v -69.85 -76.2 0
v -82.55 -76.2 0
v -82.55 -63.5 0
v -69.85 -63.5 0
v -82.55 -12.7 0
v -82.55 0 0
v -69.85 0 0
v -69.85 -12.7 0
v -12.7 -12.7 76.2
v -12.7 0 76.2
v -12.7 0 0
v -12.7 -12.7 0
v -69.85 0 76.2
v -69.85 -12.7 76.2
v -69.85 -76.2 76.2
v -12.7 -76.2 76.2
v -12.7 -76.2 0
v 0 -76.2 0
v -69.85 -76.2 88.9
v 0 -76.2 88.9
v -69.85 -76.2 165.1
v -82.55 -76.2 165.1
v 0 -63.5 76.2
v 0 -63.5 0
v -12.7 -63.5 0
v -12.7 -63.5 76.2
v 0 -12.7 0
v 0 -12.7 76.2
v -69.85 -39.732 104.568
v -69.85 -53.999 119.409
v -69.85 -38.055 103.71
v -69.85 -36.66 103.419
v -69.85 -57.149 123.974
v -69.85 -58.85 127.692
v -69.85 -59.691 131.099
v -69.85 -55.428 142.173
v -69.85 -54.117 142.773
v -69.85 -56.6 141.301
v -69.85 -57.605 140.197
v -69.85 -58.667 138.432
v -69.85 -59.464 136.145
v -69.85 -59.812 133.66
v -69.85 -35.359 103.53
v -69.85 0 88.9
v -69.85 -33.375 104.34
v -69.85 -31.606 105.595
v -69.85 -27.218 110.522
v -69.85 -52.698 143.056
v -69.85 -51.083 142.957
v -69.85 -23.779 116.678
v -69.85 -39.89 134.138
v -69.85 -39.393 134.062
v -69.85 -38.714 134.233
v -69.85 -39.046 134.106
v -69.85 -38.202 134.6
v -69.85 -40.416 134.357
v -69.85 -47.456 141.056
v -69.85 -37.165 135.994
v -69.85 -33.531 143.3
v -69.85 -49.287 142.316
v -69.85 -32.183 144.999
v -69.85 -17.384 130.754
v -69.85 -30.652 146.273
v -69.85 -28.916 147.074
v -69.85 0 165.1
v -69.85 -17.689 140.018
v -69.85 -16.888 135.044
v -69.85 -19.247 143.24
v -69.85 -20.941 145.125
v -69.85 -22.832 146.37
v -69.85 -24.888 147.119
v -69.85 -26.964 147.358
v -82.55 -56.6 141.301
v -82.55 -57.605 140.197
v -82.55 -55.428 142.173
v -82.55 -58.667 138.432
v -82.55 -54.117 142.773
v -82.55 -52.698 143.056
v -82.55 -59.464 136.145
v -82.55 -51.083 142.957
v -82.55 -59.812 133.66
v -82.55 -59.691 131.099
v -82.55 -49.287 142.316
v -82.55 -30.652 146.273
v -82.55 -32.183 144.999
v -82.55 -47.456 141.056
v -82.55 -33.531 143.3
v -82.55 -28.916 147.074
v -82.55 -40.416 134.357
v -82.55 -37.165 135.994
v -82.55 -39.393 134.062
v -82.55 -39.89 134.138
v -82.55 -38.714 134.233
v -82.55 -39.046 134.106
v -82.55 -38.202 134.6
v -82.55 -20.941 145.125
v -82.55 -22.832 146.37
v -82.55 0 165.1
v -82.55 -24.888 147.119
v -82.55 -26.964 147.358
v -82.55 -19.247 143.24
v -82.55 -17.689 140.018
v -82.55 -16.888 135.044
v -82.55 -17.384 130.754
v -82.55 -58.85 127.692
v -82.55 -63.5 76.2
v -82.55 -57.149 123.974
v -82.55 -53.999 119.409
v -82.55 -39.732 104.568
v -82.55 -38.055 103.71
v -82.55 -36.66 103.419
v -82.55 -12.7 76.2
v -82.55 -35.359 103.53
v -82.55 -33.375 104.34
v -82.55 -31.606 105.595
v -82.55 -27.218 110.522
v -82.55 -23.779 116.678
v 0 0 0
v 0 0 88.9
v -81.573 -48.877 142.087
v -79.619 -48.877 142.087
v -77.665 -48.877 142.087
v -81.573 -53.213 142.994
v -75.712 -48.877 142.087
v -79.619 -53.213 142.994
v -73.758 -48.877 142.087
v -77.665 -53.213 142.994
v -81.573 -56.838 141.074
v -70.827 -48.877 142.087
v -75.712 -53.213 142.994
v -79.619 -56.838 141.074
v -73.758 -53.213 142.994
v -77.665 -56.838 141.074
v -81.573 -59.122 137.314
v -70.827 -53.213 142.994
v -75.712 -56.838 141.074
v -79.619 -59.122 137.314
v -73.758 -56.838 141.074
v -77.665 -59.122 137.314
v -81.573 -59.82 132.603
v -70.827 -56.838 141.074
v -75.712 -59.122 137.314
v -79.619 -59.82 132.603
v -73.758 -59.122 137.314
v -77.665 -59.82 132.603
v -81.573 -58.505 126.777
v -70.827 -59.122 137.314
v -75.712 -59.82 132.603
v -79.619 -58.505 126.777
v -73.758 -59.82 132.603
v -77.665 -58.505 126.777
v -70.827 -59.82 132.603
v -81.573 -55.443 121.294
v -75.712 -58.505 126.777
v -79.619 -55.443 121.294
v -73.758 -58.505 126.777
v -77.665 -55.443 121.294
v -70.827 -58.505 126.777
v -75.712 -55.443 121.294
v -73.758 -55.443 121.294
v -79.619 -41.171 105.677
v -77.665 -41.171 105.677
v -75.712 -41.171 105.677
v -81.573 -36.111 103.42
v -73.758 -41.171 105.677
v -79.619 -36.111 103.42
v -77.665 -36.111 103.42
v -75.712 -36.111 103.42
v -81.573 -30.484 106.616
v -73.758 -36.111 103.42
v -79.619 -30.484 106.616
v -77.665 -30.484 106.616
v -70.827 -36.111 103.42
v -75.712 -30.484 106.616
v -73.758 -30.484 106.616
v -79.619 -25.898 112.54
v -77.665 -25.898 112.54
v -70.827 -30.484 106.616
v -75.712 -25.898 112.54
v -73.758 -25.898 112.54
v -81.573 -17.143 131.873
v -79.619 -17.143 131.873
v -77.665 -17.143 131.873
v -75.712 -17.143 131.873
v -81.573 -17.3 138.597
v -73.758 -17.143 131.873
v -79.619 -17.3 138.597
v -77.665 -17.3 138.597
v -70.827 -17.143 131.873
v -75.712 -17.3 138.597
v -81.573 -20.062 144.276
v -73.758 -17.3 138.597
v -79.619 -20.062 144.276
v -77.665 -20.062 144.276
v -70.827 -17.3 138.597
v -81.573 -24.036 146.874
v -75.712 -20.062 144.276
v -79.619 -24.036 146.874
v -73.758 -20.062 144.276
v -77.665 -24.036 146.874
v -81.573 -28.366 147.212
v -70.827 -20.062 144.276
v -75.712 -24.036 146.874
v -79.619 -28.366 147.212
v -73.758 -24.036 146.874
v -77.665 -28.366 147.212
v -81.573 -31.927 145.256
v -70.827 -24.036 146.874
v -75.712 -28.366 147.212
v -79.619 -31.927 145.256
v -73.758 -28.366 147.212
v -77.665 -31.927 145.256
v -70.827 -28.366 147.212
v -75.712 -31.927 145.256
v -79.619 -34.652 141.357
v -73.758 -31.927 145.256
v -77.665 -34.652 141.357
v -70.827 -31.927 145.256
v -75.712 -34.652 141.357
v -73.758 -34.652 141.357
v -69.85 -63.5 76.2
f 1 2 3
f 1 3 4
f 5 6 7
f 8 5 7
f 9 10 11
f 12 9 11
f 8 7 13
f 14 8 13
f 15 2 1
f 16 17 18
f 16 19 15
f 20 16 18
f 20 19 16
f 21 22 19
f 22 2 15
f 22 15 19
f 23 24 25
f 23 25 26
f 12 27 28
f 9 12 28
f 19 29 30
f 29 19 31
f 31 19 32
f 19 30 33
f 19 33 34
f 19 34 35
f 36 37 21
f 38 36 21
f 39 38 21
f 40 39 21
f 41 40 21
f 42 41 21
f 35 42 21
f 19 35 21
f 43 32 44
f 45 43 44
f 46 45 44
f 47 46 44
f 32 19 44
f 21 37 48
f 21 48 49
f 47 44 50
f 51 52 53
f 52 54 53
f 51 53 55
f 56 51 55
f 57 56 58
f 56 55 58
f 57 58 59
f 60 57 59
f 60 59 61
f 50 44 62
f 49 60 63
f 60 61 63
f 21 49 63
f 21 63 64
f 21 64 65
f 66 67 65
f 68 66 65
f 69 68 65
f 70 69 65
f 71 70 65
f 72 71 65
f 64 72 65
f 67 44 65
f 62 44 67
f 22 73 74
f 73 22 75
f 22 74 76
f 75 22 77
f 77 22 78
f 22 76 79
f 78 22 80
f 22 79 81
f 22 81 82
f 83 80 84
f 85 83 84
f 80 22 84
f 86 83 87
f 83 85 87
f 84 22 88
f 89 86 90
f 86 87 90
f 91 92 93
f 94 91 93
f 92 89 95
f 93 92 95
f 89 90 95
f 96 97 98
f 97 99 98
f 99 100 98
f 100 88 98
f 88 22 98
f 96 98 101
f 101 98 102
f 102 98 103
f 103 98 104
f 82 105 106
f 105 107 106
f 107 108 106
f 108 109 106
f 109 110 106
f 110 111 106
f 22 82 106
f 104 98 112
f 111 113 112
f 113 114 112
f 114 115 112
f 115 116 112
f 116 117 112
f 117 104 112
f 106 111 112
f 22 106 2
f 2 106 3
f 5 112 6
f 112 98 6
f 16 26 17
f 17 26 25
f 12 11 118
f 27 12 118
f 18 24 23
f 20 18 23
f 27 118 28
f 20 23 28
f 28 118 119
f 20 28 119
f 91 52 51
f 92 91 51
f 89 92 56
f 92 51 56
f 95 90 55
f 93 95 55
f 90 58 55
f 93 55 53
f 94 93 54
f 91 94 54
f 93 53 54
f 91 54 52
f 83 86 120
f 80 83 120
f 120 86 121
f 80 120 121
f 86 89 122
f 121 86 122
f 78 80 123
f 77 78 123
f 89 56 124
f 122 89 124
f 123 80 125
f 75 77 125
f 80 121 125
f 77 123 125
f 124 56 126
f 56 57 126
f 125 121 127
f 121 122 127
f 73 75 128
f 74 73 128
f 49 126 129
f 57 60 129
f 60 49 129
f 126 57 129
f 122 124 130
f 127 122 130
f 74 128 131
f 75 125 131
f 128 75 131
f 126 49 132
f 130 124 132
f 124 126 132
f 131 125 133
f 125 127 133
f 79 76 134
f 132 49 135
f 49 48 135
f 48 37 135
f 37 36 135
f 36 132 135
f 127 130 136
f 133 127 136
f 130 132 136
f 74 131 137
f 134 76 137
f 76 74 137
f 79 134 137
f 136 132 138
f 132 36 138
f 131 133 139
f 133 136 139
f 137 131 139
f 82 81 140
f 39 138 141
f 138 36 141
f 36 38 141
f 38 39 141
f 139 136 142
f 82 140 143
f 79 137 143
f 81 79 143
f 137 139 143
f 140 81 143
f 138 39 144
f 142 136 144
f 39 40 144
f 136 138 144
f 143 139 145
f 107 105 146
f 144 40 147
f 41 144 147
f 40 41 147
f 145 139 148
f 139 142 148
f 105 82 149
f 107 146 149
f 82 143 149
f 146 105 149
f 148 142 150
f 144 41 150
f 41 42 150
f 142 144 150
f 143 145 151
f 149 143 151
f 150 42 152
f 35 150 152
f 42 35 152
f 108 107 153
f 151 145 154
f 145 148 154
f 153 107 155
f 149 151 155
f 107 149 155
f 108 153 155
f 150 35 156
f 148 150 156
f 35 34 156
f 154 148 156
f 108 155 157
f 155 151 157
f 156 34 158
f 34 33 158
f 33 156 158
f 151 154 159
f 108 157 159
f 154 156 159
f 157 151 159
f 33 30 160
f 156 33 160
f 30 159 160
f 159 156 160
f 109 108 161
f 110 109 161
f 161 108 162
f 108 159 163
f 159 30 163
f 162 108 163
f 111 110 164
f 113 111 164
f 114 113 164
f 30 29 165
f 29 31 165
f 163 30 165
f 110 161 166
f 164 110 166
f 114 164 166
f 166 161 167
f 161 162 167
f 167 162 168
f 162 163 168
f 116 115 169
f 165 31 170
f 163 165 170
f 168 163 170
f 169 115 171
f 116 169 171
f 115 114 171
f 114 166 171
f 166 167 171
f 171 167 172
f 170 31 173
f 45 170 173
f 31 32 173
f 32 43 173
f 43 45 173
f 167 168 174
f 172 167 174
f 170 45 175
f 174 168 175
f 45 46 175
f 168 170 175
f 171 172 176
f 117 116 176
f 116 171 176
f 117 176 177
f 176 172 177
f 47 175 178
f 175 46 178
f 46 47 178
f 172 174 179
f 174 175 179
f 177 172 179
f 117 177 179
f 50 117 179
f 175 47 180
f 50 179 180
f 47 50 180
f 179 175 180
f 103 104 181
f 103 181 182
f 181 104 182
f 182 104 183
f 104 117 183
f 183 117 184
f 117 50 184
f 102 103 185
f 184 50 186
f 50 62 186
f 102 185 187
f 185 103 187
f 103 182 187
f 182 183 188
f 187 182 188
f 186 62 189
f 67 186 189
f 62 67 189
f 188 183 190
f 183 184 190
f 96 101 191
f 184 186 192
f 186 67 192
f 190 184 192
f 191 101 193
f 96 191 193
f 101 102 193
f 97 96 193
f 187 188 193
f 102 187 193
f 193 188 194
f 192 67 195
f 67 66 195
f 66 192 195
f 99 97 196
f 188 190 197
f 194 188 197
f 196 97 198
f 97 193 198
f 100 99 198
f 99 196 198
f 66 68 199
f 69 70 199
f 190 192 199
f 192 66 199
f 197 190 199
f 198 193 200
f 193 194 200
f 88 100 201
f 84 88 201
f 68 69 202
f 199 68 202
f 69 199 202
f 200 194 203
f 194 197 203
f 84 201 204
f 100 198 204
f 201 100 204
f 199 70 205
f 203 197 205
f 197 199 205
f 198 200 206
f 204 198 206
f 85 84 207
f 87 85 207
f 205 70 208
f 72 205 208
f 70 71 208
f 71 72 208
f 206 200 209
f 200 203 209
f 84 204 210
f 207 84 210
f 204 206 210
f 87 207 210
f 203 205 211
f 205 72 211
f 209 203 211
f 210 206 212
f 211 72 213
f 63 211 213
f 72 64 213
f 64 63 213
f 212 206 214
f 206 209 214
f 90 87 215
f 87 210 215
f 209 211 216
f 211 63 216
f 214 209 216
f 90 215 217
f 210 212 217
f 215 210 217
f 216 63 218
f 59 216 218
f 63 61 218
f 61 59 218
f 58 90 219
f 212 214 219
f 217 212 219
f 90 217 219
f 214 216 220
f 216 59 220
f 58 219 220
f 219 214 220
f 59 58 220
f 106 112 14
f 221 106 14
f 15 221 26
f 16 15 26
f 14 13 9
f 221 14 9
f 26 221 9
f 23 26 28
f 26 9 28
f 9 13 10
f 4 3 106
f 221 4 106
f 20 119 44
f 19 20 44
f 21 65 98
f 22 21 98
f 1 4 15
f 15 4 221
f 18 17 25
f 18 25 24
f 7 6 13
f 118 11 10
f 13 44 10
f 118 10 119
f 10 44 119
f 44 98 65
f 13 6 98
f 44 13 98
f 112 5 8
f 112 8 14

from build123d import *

# Parameters (mm, degrees)
F1_DEPTH = 76.2
F3_DEPTH = 12.7
F4_W     = 50.8
F4_H     = 76.2
F5_DEPTH = 12.7
F6_W     = 50.8
F6_H     = 76.2
F7_DEPTH = 12.7


with BuildPart() as f1:
    # F0 (on Front) → F1 (new body)
    with BuildSketch(Plane.XZ):
        Polygon((-12.7, 0), (0, 0), (0, 88.9), (-69.85, 88.9), (-69.85, 165.1), (-82.55, 165.1), (-82.55, 0), (-69.85, 0), (-69.85, 76.2), (-12.7, 76.2), align=None)
    extrude(amount=F1_DEPTH)

    # F2 (on face) → F3 (cut)
    with BuildSketch(Plane.YZ.offset(-69.85)):
        with BuildLine():
            add(Edge.make_bspline(
                [(-39.393492043, 134.0616643429), (-41.7653817973, 134.0519704591), (-48.0807223106, 144.5784906297), (-57.6687769822, 142.4438535389), (-61.2772946483, 132.1916628552), (-55.946945606, 120.4377708591), (-46.1907438844, 111.5819871786), (-36.3030491034, 98.9240075783), (-24.8231657039, 112.7896108933), (-22.4661020374, 120.9061781194), (-15.391144399, 131.3461939587), (-18.2068658762, 145.5256129763), (-29.0915819632, 148.7973145161), (-35.0789621304, 142.3066021107), (-37.4084824999, 134.069777052), (-39.393492043, 134.0616643429)],
                knots=[0, 0, 0, 0, 0.0824878816, 0.1474049882, 0.218965628, 0.3004592274, 0.388670531, 0.470601532, 0.5571987511, 0.6285678759, 0.70938938, 0.7929254096, 0.8626738507, 0.9309667611, 1, 1, 1, 1], degree=3))
        make_face()
    extrude(amount=-F3_DEPTH, mode=Mode.SUBTRACT)

    # F4 (on face) → F5 (cut)
    with BuildSketch(Plane.YZ):
        with Locations((-38.1, 38.1)):
            Rectangle(F4_W, F4_H)
    extrude(amount=-F5_DEPTH, mode=Mode.SUBTRACT)

    # F6 (on face) → F7 (cut)
    with BuildSketch(Plane(origin=(-82.55, 0, 0), x_dir=(0, -1, 0), z_dir=(-1, 0, 0))):
        with Locations((38.1, 38.1)):
            Rectangle(F6_W, F6_H)
    extrude(amount=-F7_DEPTH, mode=Mode.SUBTRACT)


solid = f1.part
